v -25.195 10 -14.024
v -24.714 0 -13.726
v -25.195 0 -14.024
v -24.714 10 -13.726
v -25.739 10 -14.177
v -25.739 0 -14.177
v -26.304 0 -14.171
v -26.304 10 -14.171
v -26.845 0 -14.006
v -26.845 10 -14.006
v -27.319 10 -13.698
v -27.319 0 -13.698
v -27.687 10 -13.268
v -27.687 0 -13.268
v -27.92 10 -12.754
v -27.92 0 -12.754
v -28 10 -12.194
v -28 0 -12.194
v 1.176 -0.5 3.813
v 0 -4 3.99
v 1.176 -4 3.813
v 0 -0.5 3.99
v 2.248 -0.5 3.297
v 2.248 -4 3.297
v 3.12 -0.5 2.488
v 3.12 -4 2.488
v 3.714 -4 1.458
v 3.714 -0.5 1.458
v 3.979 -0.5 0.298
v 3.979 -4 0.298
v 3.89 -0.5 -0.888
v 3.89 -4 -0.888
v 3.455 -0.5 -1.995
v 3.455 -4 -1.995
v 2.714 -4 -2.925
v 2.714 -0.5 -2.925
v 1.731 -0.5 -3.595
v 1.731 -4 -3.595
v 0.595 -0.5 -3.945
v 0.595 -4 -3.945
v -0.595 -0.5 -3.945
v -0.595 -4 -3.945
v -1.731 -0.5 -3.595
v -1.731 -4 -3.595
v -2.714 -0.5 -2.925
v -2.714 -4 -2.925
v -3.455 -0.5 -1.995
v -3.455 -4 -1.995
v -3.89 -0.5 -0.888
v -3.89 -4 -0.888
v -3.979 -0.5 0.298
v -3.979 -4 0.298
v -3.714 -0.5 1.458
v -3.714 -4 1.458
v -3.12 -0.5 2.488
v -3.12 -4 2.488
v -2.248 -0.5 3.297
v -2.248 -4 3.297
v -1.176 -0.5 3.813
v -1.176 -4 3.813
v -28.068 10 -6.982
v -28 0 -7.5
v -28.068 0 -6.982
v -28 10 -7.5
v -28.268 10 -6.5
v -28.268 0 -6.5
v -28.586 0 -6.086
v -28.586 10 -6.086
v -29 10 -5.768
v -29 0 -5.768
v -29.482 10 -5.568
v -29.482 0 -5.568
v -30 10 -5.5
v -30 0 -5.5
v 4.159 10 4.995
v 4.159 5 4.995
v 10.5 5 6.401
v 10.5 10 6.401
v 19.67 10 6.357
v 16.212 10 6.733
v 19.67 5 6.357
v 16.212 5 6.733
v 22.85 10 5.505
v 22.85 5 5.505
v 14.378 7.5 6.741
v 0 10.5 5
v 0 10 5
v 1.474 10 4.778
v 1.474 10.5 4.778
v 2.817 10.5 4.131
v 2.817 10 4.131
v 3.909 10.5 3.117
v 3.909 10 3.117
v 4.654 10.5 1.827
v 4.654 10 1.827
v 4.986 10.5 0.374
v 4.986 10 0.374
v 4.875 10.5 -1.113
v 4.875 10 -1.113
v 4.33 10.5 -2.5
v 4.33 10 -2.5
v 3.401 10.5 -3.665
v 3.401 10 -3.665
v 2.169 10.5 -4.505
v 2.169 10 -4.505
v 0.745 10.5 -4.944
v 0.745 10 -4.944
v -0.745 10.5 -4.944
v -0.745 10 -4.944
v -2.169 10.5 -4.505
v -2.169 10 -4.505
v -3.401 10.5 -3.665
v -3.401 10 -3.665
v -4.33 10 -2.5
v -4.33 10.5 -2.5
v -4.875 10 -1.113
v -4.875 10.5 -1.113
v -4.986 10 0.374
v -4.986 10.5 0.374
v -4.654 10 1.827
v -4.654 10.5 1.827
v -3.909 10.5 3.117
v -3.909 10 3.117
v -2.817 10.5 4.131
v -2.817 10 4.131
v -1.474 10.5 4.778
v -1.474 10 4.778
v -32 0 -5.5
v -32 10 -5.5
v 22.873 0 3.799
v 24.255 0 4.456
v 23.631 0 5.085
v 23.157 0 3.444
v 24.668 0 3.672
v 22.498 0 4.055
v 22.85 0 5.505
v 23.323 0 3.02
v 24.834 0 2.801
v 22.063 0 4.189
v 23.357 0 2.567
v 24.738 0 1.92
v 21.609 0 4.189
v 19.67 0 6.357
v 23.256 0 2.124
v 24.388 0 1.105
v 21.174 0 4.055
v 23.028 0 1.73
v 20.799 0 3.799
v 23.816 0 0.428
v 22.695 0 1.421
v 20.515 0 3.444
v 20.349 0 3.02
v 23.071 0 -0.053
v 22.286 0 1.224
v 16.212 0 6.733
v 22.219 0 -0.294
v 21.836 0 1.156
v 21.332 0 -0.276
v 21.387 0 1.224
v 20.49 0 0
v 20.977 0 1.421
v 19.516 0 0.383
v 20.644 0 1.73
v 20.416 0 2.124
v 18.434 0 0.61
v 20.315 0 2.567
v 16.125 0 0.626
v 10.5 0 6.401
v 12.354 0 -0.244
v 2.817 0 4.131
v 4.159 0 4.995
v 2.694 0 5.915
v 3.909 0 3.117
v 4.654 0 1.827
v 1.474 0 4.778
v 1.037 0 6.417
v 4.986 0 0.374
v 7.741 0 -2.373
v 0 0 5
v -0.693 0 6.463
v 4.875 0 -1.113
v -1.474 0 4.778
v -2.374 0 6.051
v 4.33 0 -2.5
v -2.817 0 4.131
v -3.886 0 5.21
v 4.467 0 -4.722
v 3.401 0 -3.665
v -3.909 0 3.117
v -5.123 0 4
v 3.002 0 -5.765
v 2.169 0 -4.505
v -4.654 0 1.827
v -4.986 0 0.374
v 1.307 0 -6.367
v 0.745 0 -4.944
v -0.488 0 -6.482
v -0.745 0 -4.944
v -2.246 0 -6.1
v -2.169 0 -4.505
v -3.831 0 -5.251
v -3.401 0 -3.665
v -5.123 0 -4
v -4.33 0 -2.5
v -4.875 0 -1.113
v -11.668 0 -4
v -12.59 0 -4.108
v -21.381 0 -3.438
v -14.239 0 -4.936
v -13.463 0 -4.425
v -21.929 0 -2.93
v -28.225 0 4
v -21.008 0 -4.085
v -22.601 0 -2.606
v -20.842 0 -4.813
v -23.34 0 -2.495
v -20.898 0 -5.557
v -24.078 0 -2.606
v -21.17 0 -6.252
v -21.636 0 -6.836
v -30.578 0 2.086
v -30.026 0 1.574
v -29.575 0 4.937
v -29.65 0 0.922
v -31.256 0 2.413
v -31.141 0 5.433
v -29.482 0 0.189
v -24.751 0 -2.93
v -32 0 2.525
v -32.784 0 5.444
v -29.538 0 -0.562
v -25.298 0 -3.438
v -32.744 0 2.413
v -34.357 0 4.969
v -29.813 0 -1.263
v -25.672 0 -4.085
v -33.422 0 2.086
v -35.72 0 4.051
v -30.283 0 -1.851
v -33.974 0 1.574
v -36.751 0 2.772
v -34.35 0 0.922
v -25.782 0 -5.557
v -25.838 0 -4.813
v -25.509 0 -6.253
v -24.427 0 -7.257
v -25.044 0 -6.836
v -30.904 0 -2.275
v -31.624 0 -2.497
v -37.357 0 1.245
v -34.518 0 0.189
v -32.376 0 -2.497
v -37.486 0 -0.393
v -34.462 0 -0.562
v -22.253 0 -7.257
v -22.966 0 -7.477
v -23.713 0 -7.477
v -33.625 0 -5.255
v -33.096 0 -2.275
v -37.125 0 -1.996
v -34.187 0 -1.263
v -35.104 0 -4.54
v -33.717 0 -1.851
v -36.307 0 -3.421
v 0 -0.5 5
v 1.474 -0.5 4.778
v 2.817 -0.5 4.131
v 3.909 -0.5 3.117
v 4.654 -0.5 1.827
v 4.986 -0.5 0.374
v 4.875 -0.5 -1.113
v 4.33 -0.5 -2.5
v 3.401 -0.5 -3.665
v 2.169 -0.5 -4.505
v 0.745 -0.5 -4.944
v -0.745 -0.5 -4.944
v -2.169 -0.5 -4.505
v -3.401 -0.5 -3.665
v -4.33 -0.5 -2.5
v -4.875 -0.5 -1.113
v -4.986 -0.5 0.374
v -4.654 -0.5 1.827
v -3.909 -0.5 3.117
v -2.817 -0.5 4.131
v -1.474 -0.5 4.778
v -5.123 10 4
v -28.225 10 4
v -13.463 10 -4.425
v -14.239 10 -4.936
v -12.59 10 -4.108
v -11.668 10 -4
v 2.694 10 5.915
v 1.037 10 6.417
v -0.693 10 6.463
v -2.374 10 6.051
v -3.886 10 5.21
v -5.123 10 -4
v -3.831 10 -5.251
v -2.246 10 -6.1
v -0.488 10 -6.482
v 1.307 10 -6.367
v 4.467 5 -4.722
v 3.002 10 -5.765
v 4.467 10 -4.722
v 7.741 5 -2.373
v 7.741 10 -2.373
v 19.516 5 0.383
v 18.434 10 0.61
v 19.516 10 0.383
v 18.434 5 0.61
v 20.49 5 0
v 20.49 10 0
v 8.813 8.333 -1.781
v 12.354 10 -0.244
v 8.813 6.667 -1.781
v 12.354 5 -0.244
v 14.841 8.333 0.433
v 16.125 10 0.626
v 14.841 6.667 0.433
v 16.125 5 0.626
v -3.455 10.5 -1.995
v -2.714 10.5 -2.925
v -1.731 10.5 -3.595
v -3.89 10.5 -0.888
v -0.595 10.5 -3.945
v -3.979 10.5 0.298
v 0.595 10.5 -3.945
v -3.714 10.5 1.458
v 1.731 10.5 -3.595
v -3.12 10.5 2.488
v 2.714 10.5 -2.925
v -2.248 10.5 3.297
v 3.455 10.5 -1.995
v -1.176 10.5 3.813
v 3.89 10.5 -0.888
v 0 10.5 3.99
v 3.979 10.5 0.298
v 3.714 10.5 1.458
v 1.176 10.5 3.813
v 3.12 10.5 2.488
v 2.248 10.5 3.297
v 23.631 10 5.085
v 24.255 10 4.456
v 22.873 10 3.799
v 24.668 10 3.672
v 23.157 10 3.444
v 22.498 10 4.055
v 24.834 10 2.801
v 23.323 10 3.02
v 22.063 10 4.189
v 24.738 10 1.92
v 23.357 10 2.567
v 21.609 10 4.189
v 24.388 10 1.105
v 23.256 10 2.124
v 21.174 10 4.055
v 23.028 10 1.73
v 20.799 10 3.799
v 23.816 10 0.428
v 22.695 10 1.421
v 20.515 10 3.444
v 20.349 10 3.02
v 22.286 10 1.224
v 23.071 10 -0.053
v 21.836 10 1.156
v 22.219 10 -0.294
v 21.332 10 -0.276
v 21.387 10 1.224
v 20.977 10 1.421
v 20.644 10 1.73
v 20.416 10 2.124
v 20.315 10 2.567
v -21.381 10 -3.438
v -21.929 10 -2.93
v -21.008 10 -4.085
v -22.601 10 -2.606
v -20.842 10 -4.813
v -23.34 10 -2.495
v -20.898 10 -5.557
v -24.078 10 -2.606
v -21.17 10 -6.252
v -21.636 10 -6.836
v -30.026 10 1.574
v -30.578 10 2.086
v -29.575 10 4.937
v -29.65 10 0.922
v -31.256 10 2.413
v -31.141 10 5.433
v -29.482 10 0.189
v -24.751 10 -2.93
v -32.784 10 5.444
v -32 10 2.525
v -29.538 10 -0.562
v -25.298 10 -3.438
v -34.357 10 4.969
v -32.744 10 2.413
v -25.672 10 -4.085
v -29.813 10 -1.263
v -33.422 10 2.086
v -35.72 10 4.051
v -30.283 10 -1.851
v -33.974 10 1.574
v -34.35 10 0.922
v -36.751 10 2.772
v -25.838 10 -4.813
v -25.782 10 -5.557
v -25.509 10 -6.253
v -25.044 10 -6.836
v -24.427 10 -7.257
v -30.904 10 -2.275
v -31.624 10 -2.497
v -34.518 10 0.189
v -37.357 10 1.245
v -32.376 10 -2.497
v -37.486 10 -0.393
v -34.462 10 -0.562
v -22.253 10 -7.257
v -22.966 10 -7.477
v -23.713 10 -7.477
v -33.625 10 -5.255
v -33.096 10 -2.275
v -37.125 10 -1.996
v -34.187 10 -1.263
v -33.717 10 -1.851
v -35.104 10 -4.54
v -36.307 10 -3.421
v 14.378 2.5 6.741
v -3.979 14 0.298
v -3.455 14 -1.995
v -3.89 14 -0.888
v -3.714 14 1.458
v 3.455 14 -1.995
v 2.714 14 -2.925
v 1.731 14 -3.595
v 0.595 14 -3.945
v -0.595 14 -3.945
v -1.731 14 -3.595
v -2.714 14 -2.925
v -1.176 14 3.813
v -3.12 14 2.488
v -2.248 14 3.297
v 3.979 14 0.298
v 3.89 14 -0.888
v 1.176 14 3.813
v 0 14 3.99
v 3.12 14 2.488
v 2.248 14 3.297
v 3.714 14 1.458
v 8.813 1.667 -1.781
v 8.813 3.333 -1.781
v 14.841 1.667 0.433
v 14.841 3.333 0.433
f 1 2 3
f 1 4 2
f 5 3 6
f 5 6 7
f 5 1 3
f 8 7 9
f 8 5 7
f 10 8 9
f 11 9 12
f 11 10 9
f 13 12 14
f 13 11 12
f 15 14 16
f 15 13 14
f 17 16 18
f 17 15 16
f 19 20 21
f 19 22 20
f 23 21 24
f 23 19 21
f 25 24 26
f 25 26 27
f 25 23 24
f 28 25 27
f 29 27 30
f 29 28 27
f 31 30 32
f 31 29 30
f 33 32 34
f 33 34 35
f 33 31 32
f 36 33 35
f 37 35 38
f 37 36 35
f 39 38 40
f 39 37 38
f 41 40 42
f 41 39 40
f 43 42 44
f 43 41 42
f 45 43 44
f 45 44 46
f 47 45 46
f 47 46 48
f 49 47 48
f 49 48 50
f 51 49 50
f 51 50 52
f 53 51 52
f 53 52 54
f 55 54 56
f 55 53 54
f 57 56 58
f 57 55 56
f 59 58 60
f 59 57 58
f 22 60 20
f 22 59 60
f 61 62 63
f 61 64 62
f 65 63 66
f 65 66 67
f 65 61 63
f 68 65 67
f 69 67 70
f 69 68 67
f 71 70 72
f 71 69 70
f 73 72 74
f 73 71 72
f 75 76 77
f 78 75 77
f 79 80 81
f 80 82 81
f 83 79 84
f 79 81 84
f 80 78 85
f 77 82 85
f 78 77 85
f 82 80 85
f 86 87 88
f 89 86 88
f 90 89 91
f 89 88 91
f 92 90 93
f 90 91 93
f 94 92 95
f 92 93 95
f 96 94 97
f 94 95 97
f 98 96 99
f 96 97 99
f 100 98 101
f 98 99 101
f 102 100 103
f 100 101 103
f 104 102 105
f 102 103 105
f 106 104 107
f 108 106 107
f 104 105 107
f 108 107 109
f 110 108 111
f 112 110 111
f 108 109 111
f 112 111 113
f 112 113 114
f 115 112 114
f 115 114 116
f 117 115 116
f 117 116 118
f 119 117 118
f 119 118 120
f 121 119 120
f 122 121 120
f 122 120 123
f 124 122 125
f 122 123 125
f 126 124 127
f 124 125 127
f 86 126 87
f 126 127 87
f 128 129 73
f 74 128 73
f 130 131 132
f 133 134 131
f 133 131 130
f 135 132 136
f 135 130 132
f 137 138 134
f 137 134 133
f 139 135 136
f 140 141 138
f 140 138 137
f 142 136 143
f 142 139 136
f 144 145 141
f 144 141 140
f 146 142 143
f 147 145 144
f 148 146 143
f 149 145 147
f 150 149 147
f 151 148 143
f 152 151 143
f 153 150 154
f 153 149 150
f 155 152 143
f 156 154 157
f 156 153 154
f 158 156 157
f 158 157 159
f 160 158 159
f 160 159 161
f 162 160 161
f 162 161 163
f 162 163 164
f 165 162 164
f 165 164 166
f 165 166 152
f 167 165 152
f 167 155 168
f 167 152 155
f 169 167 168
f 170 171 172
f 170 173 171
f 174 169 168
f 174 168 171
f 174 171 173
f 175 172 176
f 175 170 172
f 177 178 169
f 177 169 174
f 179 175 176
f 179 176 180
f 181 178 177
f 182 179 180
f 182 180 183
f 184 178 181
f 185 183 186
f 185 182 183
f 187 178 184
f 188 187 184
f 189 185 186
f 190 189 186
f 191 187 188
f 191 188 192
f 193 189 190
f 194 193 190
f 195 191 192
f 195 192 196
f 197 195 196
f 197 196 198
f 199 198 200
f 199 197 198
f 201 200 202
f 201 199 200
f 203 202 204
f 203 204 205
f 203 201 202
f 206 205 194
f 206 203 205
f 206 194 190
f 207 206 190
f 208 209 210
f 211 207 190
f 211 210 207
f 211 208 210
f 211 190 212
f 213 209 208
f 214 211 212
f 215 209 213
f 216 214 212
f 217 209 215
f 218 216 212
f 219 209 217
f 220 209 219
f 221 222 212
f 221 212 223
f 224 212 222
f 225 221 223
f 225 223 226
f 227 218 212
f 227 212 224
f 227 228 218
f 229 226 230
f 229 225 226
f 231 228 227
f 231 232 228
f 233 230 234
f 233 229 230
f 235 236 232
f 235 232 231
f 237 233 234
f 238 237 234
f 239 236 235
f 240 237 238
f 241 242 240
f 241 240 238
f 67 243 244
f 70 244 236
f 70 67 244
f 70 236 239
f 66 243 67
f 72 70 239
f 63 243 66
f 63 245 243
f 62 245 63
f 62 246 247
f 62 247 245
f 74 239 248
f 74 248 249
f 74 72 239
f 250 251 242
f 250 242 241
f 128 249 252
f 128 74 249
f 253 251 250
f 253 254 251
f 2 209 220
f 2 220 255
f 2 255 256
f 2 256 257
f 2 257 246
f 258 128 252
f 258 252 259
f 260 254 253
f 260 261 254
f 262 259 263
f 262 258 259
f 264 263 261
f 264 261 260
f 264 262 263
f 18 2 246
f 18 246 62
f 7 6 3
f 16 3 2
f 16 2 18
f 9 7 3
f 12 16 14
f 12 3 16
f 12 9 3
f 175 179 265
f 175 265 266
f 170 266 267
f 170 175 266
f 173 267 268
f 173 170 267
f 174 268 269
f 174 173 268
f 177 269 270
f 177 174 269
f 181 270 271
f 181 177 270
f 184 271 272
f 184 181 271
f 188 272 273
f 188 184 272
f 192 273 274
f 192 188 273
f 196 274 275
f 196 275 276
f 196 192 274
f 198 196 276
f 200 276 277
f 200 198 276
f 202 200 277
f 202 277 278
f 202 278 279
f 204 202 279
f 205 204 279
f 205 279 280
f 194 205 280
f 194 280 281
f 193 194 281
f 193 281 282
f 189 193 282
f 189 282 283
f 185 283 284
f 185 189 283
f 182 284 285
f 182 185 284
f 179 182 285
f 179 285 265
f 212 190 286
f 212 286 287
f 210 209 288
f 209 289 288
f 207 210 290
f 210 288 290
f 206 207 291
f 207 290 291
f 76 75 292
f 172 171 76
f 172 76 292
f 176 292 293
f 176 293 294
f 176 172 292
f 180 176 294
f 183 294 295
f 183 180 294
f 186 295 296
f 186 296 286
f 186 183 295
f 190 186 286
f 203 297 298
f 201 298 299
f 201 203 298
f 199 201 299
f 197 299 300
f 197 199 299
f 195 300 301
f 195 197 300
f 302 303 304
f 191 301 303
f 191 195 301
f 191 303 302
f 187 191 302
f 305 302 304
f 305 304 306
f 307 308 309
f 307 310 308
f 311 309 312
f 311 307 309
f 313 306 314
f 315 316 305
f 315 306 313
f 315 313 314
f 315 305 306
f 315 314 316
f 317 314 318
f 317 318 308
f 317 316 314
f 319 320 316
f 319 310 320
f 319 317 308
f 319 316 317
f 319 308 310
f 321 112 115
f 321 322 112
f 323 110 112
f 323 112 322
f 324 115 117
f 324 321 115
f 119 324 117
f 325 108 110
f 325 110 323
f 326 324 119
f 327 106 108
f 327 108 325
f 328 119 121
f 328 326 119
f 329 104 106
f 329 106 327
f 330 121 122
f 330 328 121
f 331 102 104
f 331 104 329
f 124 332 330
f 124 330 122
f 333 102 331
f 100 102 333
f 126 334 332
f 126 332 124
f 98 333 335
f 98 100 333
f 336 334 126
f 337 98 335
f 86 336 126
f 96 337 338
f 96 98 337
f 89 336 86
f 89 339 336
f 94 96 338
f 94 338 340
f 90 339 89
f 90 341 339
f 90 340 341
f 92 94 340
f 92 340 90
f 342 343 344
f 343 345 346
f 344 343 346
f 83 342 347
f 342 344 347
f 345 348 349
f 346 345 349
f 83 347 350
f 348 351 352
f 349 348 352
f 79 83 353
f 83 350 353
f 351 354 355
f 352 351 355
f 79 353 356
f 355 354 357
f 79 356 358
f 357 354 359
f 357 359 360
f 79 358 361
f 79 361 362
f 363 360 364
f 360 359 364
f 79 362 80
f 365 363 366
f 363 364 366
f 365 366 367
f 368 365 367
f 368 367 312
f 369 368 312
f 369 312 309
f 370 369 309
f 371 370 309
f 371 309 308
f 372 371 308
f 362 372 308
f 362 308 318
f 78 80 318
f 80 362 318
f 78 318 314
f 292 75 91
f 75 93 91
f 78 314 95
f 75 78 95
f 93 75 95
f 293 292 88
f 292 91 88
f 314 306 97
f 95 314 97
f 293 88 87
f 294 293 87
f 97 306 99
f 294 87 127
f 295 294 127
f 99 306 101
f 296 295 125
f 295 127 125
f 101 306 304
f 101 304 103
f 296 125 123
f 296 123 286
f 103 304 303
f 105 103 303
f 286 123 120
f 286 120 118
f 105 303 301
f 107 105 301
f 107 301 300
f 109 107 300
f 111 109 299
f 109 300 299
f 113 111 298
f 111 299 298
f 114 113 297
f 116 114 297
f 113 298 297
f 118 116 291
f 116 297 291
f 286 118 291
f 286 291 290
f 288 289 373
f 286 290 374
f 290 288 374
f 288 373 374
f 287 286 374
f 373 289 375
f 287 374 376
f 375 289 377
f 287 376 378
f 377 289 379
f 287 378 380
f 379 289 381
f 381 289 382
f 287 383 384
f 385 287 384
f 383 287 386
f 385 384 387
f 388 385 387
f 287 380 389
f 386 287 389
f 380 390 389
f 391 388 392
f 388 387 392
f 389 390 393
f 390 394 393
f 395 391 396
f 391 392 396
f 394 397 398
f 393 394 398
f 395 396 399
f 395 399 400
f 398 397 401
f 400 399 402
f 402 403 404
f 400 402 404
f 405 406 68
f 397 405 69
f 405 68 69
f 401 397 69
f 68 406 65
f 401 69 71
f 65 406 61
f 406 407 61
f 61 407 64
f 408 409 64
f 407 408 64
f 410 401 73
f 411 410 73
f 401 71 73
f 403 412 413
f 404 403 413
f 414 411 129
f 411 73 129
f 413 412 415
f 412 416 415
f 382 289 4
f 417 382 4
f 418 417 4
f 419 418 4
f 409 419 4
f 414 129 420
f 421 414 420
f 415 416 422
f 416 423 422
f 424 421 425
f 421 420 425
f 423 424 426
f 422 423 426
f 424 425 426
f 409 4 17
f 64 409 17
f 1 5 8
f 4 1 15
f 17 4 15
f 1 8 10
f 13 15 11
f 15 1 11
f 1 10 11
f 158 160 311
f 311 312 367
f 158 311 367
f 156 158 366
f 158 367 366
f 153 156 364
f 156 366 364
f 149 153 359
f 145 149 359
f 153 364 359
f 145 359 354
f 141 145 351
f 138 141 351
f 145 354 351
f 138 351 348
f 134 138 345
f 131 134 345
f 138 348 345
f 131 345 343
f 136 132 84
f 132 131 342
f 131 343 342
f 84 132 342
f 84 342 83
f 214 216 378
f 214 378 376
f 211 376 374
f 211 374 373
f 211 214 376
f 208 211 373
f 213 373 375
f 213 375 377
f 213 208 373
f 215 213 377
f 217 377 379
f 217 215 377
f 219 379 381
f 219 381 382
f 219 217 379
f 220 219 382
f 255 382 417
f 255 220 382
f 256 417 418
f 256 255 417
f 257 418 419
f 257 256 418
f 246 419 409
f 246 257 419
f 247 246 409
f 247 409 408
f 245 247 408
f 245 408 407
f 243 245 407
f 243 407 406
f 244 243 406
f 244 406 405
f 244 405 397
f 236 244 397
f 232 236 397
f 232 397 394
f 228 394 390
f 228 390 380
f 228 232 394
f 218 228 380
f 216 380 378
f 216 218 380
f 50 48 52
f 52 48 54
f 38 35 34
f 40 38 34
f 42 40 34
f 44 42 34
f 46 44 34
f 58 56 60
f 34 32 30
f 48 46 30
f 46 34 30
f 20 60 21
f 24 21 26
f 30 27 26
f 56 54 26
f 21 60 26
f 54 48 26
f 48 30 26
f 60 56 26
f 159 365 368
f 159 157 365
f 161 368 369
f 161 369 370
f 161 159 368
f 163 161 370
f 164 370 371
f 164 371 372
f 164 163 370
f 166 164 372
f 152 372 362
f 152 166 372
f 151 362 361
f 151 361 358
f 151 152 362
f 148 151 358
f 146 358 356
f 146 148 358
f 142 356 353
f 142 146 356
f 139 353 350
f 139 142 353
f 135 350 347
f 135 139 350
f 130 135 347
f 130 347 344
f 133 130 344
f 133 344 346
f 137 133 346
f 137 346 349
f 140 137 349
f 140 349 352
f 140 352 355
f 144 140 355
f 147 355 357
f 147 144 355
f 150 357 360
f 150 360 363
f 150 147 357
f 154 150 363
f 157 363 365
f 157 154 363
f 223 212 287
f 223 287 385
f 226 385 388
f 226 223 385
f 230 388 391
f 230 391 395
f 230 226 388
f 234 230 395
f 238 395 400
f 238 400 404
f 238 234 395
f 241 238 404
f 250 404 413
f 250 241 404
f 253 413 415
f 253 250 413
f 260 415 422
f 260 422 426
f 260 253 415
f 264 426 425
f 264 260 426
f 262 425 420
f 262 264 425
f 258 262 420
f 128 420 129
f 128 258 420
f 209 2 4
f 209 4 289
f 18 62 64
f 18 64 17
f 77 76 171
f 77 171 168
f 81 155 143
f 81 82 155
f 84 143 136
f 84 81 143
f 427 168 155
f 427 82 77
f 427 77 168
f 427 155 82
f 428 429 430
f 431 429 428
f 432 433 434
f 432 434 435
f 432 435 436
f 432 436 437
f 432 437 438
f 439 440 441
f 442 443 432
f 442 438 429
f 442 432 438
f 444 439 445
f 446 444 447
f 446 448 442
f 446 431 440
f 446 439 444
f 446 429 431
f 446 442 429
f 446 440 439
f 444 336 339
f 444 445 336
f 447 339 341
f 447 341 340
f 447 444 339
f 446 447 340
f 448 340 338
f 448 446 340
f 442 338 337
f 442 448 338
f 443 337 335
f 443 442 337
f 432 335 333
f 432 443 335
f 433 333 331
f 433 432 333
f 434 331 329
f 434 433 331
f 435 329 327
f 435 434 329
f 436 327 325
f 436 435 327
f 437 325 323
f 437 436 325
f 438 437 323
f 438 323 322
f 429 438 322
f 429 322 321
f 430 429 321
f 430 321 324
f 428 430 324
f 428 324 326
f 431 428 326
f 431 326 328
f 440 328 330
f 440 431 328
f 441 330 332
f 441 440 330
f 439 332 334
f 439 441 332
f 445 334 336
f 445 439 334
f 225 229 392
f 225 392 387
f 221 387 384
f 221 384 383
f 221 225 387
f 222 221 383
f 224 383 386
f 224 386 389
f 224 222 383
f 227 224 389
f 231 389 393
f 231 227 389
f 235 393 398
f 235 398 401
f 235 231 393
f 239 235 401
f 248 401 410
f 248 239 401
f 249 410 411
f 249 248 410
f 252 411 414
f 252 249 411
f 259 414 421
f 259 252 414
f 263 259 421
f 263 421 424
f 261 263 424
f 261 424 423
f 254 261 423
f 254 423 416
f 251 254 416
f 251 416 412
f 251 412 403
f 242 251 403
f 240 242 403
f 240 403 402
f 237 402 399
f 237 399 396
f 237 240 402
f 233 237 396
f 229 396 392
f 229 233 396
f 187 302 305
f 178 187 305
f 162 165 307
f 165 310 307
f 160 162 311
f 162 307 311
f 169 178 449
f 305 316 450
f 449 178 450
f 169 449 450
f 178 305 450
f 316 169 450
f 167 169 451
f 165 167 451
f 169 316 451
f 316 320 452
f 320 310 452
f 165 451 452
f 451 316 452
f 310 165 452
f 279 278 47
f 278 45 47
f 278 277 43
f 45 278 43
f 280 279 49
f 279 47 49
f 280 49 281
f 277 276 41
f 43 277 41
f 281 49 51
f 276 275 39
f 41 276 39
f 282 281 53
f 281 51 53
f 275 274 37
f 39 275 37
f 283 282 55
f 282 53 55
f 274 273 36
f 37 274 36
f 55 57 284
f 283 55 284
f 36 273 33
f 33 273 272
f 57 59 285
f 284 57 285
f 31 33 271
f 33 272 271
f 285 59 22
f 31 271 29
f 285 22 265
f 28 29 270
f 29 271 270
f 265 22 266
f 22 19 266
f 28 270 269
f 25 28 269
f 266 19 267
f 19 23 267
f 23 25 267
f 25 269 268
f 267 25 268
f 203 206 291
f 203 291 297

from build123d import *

# Parameters (mm, degrees)
SKETCH_1_R      = 2.525
SKETCH_1_R_2    = 2.505
EXTRUDE_1_DEPTH = 10
SKETCH_2_R      = 1.525
EXTRUDE_2_DEPTH = 5
SKETCH_5_R      = 3.99
EXTRUDE_4_DEPTH = 9
FILLET_1_R      = 4
FILLET_2_R      = 2
FILLET_3_R      = 2
SKETCH_6_R      = 5
EXTRUDE_5_DEPTH = 0.5


with BuildPart() as part:
    # 草图1 → 凸台-拉伸1 (new body)
    with BuildSketch(Plane(origin=(0, 0, 0), x_dir=(1, 0, 0), z_dir=(0, 1, 0))):
        with BuildLine():
            Line((-5.123475383, -4), (-28.225082782, -4))
            ThreePointArc((-28.225082782, -4), (-37.111262075, -2.031009601), (-32, 5.5))
            Line((-32, 5.5), (-28, 5.5))
            Line((-28, 5.5), (-28, 16.482886319))
            Line((-28, 16.482886319), (-13.123475383, 4))
            Line((-13.123475383, 4), (-5.123475383, 4))
            ThreePointArc((-5.123475383, 4), (6.5, 0), (-5.123475383, -4))
        make_face()
        with Locations(Location((-32, 0, 0), (0, 0, 270))):
            Circle(SKETCH_1_R, mode=Mode.SUBTRACT)
        with Locations(Location((-23.339745962, 5, 0), (0, 0, 270))):
            Circle(SKETCH_1_R_2, mode=Mode.SUBTRACT)
    extrude(amount=EXTRUDE_1_DEPTH)

    # 草图2 → 凸台-拉伸2 (add, symmetric)
    with BuildSketch(Plane(origin=(0, 5, 0), x_dir=(1, 0, 0), z_dir=(0, 1, 0))):
        with BuildLine():
            ThreePointArc((4.159420521, -4.994919512), (6.496753335, -0.205416905), (4.466659496, 4.722176717))
            add(Edge.make_bspline(
                [(4.466659496, 4.722176717), (7.284864094, 2.056465312), (15.716737601, -2.396247552), (20.490071148, 0)],
                knots=[0, 0, 0, 0, 1, 1, 1, 1], degree=3))
            ThreePointArc((20.490071148, 0), (24.593372298, -1.499185377), (22.849655998, -5.50469291))
            add(Edge.make_bspline(
                [(4.159420521, -4.994919512), (15.25095487, -8.232572742), (22.849655998, -5.50469291)],
                knots=[0, 0, 0, 1, 1, 1], degree=2))
        make_face()
        with Locations(Location((21.836015336, -2.681125555, 0), (0, 0, 90))):
            Circle(SKETCH_2_R, mode=Mode.SUBTRACT)
    extrude(amount=EXTRUDE_2_DEPTH, both=True)

    # 草图5 → 凸台-拉伸4 (add, symmetric)
    with BuildSketch(Plane(origin=(0, 5, 0), x_dir=(1, 0, 0), z_dir=(0, 1, 0))):
        with Locations(Location((0, 0, 0), (0, 0, 270))):
            Circle(SKETCH_5_R)
    extrude(amount=EXTRUDE_4_DEPTH, both=True)

    # 圆角1
    fillet_1_edges = [part.edges().sort_by_distance(p)[0] for p in [
        (-13.123475383, 5, -4),
    ]]
    fillet(fillet_1_edges, radius=FILLET_1_R)

    # 圆角2
    fillet_2_edges = [part.edges().sort_by_distance(p)[0] for p in [
        (-28, 5, -16.482886319),
    ]]
    fillet(fillet_2_edges, radius=FILLET_2_R)

    # 圆角3
    fillet_3_edges = [part.edges().sort_by_distance(p)[0] for p in [
        (-28, 5, -5.5),
    ]]
    fillet(fillet_3_edges, radius=FILLET_3_R)

    # 草图6 → 凸台-拉伸5 (add)
    with BuildSketch(Plane(origin=(0, 10, 0), x_dir=(1, 0, 0), z_dir=(0, 1, 0))):
        with Locations(Location((0, 0, 0), (0, 0, 270))):
            Circle(SKETCH_6_R)
    extrude_5 = extrude(amount=EXTRUDE_5_DEPTH)

    # 镜向1: 凸台-拉伸5 across plane
    add(extrude_5.mirror(Plane.ZX.offset(5)))


solid = part.part
